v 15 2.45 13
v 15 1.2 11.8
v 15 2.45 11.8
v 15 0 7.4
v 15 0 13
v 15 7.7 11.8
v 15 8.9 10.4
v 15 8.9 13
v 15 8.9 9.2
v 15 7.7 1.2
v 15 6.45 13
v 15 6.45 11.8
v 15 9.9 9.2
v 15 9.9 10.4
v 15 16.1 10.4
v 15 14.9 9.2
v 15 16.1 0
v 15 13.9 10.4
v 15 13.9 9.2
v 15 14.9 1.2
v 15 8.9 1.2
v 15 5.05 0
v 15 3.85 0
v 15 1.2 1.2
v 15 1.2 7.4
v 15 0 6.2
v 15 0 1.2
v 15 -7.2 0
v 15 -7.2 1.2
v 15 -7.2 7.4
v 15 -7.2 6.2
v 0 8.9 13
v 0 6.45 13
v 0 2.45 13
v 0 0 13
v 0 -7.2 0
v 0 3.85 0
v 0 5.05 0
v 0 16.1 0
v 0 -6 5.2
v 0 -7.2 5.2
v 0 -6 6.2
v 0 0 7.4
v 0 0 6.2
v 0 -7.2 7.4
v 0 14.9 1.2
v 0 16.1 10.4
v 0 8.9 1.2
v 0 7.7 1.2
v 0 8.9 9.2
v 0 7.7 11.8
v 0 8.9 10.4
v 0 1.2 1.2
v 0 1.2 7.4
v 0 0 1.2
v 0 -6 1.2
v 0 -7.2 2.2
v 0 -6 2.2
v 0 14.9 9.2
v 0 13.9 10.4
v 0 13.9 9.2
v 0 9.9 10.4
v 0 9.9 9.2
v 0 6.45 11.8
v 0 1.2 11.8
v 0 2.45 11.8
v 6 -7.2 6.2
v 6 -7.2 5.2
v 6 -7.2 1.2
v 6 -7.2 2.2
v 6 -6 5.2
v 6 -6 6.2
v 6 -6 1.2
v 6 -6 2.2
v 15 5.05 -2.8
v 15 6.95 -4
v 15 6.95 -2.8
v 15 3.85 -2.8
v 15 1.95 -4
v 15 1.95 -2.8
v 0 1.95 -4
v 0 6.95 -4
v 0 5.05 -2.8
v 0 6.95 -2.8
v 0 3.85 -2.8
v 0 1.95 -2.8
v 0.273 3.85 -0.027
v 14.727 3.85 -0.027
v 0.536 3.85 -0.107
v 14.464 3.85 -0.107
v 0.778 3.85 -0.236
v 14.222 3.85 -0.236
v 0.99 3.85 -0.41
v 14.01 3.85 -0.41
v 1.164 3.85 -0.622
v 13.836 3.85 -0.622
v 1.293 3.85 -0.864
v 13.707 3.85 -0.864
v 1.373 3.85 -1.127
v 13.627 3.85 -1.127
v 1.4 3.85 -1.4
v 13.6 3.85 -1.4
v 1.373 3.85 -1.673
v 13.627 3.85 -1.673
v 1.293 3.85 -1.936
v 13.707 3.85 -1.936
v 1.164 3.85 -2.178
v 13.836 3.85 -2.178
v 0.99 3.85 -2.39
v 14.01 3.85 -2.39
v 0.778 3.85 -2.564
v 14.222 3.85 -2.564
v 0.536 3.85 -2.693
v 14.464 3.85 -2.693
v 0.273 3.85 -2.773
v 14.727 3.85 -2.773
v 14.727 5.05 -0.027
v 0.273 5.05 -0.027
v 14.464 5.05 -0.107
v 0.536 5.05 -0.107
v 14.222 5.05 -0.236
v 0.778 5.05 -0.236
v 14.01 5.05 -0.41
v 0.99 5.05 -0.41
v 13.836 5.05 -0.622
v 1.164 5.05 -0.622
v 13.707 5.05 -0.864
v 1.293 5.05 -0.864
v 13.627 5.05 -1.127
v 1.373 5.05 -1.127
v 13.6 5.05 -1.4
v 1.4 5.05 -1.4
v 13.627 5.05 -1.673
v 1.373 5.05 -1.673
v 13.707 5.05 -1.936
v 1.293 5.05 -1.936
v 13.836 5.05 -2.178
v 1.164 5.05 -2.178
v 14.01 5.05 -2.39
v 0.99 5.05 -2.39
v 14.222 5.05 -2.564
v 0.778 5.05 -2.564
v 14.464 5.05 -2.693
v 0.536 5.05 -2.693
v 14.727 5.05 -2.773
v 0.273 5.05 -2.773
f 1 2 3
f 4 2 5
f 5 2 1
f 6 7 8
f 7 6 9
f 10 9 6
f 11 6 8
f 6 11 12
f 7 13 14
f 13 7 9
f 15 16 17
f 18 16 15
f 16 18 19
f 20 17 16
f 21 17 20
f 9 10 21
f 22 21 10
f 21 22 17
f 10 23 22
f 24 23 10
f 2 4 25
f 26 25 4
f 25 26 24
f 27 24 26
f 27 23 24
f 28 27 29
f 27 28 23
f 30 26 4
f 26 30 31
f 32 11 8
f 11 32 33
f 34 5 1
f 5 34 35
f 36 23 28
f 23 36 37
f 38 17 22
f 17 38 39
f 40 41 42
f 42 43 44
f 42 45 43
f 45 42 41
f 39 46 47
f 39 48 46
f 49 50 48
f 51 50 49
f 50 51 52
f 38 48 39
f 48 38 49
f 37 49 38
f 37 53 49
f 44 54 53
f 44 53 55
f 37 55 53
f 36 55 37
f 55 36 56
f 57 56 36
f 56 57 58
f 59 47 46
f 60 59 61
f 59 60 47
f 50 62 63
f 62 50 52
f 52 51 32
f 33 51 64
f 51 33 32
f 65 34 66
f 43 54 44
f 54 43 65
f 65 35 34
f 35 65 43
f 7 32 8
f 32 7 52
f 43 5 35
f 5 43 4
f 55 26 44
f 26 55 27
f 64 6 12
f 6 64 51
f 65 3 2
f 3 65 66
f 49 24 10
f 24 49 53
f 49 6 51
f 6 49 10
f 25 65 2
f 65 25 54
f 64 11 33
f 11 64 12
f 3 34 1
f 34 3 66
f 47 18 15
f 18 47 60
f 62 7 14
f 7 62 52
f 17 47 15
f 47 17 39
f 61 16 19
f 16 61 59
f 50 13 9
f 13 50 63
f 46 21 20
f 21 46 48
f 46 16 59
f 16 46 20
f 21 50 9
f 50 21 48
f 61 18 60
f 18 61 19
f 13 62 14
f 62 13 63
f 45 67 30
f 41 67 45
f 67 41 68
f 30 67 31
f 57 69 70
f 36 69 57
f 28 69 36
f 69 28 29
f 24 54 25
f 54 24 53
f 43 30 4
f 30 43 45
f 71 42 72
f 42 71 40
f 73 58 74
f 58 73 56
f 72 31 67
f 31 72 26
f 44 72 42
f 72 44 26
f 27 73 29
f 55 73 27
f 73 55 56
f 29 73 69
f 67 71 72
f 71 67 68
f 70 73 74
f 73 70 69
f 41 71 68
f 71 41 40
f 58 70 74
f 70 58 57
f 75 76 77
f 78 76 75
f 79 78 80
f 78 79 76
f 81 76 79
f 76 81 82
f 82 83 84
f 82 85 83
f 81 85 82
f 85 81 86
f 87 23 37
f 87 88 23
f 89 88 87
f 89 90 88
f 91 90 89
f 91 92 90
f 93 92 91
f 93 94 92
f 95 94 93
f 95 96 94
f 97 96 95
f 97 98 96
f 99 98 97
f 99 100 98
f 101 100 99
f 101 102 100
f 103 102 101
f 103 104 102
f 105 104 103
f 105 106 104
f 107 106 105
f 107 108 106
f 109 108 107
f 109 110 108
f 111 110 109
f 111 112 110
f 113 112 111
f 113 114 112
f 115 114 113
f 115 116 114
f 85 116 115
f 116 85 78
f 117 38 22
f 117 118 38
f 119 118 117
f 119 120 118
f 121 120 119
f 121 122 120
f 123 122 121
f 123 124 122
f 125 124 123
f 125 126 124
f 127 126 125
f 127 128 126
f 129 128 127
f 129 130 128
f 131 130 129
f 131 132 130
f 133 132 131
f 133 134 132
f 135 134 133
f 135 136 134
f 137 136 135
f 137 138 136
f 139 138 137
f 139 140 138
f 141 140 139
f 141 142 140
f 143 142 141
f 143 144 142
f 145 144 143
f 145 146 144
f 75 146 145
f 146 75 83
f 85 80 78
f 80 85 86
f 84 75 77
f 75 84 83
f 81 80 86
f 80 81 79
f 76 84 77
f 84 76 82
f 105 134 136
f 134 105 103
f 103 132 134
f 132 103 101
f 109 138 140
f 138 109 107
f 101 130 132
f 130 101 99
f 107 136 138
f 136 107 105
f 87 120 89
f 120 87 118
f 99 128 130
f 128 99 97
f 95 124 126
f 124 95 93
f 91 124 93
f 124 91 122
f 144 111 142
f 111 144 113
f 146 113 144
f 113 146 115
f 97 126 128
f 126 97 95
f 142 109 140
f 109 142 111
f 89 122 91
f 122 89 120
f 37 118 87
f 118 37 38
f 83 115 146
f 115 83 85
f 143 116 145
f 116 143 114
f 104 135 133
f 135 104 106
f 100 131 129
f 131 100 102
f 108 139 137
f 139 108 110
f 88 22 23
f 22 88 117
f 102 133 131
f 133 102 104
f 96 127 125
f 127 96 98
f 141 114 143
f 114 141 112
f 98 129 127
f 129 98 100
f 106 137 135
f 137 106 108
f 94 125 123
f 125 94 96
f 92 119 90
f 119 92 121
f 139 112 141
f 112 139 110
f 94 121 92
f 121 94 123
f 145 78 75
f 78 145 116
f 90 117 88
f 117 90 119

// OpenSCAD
main();

module main() {
    headset_mount();
    translate([0, 6.5+1.2, 0])
    ps4mic_mount();

translate([0, 1.2, 0])
    rotate(90, [1, 0, 0])
        ps4spk_mount();

    translate([0, 1.2 + (6.5/2) + (1.2/2), 0])
    rotate(180, [1, 0, 0])
        cable_hold();
}

module cable_hold() {
    l=15;
    h=4;
    w=5;
    thickness = 1.2;

    module round_cut() {
        rotate(90, [1, 0, 0])
        cylinder(h=thickness, r=(h/2)-(thickness/2), $fn=32);
    }

    difference() {
        union() {
            cube([l, thickness, h]);
            translate([0, (thickness/2)-(w/2), h-thickness])
            cube([l, w, thickness]);
        }
        translate([0, thickness, (h/2)-(thickness/2)])
            round_cut();
        translate([l, thickness, (h/2)-(thickness/2)])
            round_cut();
    }

}

module headset_mount() {
    thickness = 1.2;

    h=10.6;
    w=6.5;
    l=15;
    cut_w=4;

    difference() {
        cube([l, w+thickness+thickness, h+thickness+thickness]);
        translate([0, thickness, thickness])
            cube([l, w, h]);
        translate([0, thickness+(w/2)-(cut_w/2), h+thickness])
            cube([l, cut_w, thickness]);
    }
}

module ps4mic_mount() {
    thickness = 1.2;

    h=8;
    w=6;
    l=15;
    cut_w=4;

    difference() {
        cube([l, w+thickness+thickness, h+thickness+thickness]);
        translate([0, thickness, thickness])
            cube([l, w, h]);
        translate([0, thickness+(w/2)-(cut_w/2), h+thickness])
            cube([l, cut_w, thickness]);
    }
}

module ps4spk_mount() {
    thickness = 1.2;

    h=6;
    w=5;
    l=15;
    cut_w=3;
    cut_l=6;

    difference() {
        cube([l, w+thickness+thickness, h+thickness+thickness]);
        translate([0, thickness, thickness])
            cube([l, w, h]);
        translate([0, thickness+(w/2)-(cut_w/2), h+thickness])
            cube([cut_l, cut_w, thickness]);
        translate([cut_l, thickness, h+thickness])
            cube([l-cut_l, w, thickness]);
    }
}
